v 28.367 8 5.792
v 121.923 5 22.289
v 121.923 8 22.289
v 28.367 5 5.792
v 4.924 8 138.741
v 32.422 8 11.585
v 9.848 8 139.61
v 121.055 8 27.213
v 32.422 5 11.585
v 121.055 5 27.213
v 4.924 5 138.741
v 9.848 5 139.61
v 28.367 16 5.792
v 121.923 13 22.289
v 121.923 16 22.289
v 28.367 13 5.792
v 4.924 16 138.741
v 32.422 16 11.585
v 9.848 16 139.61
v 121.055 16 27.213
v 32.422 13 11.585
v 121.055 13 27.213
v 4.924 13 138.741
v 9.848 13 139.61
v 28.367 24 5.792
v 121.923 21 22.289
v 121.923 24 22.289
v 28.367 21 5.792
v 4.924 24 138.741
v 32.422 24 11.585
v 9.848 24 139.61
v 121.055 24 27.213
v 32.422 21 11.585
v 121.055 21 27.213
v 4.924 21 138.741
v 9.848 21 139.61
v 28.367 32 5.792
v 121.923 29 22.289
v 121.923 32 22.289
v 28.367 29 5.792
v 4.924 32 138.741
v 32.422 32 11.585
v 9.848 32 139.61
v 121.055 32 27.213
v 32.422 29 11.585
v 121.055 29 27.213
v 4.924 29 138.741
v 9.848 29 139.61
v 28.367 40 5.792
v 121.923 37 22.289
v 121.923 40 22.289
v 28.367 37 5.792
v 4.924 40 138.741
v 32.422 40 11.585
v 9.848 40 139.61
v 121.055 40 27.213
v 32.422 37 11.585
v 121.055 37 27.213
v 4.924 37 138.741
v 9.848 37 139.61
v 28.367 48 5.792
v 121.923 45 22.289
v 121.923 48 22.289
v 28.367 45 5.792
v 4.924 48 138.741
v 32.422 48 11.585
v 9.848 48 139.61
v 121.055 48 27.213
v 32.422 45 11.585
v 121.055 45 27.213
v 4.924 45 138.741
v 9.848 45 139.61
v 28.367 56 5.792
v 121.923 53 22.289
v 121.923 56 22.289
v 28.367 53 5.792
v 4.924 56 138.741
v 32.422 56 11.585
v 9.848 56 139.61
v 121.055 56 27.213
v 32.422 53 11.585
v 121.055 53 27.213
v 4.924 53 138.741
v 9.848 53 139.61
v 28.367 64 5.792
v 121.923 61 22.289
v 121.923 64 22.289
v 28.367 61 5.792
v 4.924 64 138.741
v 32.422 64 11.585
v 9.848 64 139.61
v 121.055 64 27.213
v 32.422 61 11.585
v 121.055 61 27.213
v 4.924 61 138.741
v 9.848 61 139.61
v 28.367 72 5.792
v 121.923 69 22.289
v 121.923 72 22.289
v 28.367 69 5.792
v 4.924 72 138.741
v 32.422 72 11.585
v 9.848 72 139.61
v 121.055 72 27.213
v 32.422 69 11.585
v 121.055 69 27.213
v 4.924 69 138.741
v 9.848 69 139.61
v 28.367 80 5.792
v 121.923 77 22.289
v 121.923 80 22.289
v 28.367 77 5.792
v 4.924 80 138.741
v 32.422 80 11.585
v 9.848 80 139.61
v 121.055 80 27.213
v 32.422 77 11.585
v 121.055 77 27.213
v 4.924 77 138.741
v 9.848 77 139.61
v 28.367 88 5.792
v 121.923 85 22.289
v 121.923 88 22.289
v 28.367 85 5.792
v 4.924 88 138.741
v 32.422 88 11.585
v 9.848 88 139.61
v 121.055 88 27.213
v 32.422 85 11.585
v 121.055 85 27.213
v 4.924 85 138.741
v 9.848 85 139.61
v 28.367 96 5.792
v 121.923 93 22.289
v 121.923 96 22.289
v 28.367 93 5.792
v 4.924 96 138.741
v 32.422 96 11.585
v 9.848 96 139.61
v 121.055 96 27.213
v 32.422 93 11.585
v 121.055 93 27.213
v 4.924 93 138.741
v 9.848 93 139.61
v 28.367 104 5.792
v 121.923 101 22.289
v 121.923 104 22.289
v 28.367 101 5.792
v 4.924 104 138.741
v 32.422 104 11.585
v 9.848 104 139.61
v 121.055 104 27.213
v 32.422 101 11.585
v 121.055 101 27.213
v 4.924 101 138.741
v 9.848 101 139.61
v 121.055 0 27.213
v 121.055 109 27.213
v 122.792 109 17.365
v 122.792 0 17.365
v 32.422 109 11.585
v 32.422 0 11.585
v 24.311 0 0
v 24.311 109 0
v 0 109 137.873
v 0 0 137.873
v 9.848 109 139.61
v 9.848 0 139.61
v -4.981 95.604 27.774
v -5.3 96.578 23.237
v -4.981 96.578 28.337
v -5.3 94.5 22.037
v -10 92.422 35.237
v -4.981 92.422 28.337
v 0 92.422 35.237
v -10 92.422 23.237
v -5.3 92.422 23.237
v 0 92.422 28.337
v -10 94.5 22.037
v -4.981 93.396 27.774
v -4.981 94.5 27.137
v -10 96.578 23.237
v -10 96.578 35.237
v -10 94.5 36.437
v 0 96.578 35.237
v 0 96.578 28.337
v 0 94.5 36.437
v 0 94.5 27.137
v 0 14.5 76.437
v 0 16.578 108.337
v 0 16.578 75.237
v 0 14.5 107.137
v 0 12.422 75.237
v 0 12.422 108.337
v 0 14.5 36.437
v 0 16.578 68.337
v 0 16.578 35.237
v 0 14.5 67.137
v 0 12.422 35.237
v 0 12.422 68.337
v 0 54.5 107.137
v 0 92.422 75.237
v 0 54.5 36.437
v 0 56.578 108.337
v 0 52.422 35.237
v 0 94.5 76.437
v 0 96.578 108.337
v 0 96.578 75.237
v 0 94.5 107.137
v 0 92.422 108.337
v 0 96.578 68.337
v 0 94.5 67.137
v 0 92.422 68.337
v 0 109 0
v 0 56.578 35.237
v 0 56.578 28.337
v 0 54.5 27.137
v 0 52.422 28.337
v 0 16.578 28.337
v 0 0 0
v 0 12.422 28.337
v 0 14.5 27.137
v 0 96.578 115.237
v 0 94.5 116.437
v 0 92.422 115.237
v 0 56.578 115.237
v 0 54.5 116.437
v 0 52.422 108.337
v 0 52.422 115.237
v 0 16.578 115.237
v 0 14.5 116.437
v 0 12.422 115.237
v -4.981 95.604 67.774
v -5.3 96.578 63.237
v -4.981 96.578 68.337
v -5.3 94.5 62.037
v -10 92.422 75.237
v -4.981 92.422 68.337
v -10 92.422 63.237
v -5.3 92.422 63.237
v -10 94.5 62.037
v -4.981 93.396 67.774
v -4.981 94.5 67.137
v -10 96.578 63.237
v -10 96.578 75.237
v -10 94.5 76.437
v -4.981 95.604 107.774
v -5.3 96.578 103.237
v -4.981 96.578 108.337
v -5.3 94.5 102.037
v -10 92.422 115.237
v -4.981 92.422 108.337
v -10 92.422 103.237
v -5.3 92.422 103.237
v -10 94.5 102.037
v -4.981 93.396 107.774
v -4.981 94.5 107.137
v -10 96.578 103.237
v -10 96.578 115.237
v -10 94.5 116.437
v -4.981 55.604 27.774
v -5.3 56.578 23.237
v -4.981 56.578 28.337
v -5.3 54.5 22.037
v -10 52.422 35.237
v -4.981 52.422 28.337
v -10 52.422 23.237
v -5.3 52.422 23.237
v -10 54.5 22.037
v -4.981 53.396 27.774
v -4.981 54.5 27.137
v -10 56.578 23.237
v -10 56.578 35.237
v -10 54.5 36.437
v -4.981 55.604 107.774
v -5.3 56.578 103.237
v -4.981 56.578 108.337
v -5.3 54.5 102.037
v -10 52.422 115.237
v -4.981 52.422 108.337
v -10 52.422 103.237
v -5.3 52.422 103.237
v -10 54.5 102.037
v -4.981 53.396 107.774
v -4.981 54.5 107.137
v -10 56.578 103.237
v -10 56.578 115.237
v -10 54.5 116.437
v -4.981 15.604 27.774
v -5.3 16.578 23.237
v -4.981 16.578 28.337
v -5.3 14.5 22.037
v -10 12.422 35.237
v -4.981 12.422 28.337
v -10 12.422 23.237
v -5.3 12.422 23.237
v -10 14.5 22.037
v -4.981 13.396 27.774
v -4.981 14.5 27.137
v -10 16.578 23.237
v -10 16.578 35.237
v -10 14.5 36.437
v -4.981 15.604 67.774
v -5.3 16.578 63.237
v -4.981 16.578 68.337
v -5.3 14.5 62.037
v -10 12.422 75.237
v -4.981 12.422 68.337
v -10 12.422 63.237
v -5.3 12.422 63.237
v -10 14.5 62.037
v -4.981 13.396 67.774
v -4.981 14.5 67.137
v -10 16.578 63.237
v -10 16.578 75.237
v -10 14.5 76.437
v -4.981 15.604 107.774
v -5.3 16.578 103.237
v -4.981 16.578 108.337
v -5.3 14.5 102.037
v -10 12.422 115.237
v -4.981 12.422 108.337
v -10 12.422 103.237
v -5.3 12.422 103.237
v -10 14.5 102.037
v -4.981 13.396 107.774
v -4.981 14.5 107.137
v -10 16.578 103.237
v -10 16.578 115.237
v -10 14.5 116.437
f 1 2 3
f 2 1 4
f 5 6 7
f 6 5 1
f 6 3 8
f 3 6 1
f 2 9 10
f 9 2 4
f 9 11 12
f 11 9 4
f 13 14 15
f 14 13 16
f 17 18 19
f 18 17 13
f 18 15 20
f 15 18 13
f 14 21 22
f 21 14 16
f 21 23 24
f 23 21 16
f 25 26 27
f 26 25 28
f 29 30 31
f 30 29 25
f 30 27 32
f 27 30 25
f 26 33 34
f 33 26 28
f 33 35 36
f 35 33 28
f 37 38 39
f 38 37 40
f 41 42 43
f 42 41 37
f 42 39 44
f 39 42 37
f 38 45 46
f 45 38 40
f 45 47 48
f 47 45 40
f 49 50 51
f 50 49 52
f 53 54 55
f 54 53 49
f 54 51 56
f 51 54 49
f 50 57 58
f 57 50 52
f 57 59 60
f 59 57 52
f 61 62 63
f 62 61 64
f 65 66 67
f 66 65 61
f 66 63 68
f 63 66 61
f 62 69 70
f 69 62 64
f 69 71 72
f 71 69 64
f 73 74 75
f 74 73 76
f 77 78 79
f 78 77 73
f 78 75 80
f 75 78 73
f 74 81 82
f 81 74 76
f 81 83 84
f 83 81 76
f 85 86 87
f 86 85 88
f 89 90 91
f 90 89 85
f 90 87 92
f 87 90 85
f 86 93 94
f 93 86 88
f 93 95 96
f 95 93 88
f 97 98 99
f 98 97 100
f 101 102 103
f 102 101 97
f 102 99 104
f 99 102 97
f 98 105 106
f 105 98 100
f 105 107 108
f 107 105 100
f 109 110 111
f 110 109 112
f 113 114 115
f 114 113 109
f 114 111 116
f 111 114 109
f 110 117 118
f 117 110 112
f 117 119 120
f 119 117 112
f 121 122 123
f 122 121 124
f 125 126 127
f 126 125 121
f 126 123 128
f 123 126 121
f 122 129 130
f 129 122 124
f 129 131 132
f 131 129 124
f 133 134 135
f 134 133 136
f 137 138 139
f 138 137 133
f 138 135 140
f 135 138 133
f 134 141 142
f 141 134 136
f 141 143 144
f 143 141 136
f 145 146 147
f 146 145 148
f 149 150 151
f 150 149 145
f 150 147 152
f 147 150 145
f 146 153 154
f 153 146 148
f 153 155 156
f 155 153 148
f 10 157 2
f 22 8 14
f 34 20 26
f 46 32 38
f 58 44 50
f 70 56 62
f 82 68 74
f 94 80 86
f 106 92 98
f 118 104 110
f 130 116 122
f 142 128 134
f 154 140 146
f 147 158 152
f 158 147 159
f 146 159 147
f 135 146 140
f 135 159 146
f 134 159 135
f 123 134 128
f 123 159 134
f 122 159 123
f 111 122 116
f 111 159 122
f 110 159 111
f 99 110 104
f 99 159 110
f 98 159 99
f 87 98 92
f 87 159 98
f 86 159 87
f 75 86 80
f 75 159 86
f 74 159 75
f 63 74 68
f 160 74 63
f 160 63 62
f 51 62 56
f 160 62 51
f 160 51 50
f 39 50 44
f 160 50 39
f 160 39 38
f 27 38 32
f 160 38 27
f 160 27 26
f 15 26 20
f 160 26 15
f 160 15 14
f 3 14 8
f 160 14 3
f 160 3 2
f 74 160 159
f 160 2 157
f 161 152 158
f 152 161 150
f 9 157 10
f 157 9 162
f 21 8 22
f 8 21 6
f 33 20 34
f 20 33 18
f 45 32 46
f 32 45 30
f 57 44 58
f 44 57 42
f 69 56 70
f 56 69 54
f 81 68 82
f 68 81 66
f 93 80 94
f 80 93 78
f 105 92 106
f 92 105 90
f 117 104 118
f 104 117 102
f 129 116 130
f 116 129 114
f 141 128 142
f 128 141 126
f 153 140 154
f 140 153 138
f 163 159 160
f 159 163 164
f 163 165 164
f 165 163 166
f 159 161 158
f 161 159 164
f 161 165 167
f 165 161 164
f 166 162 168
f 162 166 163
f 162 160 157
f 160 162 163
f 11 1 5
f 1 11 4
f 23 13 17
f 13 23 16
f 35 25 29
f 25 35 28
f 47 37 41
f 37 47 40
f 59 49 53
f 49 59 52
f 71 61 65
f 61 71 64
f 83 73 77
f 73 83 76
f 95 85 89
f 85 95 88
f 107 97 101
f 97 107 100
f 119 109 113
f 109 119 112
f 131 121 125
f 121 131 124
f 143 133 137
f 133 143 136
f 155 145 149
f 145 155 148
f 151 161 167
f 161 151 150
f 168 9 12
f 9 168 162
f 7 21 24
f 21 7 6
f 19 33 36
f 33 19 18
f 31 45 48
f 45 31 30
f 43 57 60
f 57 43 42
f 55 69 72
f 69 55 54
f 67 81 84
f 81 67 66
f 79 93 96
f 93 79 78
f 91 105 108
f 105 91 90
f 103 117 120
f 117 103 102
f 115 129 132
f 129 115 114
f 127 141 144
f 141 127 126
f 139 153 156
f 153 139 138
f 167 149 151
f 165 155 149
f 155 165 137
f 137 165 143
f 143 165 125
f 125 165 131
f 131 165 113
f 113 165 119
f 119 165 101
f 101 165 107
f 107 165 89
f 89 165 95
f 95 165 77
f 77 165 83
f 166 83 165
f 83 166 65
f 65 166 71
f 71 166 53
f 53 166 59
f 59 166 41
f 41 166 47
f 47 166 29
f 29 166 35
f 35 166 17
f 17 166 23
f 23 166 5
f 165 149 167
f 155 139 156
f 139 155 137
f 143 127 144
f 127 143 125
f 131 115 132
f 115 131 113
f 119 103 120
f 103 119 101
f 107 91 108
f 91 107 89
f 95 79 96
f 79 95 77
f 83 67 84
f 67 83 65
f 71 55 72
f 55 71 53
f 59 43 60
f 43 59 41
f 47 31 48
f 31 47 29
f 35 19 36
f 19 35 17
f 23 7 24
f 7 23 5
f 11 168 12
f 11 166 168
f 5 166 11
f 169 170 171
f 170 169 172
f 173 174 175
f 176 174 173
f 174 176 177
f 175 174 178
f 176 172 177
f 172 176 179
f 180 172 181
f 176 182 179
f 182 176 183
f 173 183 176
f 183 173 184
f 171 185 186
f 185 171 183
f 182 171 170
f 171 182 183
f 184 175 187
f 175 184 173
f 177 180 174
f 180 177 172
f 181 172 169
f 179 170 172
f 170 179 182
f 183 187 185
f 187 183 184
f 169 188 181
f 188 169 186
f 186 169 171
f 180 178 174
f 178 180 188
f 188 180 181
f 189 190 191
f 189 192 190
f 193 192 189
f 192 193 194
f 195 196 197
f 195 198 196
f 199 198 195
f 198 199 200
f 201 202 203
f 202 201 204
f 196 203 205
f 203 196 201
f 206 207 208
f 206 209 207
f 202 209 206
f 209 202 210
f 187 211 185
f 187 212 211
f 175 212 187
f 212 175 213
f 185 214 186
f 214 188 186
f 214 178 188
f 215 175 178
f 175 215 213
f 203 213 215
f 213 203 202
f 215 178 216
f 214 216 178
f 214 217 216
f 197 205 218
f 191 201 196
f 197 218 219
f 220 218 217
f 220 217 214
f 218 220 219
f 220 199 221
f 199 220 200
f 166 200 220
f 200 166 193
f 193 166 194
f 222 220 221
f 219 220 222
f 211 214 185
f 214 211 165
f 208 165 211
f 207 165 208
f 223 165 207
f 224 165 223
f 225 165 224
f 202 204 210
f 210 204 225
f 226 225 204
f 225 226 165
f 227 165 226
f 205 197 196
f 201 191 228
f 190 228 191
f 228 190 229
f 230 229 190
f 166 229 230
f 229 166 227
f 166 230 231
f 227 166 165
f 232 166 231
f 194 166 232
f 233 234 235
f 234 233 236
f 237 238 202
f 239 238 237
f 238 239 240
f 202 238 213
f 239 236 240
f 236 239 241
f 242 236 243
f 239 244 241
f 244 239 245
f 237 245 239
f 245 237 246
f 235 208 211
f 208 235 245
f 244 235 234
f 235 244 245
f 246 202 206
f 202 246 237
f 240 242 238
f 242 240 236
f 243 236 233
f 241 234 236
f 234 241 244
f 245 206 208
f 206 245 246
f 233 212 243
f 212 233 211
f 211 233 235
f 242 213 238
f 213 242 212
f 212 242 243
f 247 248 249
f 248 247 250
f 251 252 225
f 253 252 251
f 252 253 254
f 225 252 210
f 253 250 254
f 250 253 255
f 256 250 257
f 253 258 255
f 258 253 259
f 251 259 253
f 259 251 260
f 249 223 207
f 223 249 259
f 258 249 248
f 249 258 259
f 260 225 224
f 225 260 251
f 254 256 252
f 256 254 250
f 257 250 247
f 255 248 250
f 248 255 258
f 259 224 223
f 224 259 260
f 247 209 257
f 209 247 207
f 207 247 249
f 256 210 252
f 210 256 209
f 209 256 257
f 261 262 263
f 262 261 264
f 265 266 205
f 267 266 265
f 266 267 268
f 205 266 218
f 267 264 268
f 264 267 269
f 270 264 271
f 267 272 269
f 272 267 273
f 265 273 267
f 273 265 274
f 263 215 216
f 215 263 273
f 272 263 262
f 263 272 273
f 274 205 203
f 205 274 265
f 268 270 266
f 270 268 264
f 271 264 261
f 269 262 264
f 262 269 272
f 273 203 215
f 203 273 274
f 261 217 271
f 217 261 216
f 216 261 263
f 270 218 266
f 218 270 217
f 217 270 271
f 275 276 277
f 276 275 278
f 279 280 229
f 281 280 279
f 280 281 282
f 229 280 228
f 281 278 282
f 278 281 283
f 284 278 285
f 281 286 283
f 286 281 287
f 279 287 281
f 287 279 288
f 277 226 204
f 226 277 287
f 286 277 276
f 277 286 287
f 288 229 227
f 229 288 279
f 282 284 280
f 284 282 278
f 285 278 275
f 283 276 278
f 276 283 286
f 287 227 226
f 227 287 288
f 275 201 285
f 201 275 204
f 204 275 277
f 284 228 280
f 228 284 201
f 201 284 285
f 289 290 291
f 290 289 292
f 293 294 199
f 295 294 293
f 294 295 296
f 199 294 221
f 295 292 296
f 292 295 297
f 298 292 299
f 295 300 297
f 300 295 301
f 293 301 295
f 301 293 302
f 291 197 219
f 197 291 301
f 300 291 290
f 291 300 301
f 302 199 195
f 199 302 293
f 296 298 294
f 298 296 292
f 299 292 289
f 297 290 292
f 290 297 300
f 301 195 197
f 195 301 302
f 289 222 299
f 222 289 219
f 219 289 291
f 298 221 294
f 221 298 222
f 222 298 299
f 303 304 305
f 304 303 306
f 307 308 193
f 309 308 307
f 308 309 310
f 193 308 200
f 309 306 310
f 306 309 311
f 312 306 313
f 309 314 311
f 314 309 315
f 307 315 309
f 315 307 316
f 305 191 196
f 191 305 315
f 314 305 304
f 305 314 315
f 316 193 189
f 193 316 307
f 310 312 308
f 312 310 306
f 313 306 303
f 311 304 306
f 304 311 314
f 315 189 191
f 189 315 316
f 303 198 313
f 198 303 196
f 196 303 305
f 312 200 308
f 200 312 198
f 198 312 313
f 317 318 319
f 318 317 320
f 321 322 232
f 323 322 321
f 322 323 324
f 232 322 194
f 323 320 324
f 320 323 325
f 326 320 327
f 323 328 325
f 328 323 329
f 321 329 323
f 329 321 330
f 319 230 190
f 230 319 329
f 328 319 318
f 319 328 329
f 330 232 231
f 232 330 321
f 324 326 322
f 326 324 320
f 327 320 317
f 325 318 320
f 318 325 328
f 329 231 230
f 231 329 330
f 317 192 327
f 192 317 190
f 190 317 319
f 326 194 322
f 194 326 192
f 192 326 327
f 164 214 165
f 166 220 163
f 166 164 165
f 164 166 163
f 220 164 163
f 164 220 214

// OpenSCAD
// SKADIS PCB Holder

SLOTS = 13;
SLOT_WIDTH = 3;
SLOT_SPACING = 5;
SLOT_DEPTH = 5;
HEIGHT = 140;
DEPTH = 100;
WALL = 5;
ANGLE = 10;

tiny = 0.01;

aoffset = sin(ANGLE) * HEIGHT;
boffset = cos(ANGLE) * HEIGHT; 
echo(aoffset, boffset);

w = SLOTS * (SLOT_WIDTH + SLOT_SPACING) + SLOT_SPACING;

translate([aoffset,0,0]) rotate([0,-ANGLE,0]) {
  // Bottom
  SlottedPlate(DEPTH, w);
  // Upright
  rotate([0,90,0]) translate([-HEIGHT,0,0]) SlottedPlate(HEIGHT, w);
}

// Body
translate([0,w,0]) rotate([90,0,0]) linear_extrude(w) polygon([
  [0,0], [0,boffset], [aoffset,0]
]);

translate([0,w,0]) rotate([0,0,-90]) hooks(w, boffset, "edge", 10);

module SlottedPlate(x,y) {
  difference() {
    cube([x, y, WALL + SLOT_DEPTH]);
    for (s=[0:1:SLOTS-1]) {
      translate([-tiny, SLOT_SPACING + s * (SLOT_SPACING + SLOT_WIDTH), WALL]) cube([x+2*tiny, SLOT_WIDTH, SLOT_DEPTH+tiny]);
    }
  }
}

module hooks(x, y, mode="all", min_edge=10) {
  hook_width = 5;
  hook_height = 15;
  cols = floor((x - 2*min_edge - hook_width)/20)+1;
  offsetX = (x - ((cols-1)*20)) / 2;
  echo("cols", cols)
  echo("offsetX", offsetX);

  rows = floor((y - 2*min_edge)/40)+1;
  offsetY = (hook_height/2) + (y - ((rows)*40)) / 2;
  echo("rows", rows)
  echo("offsetY", offsetY);

  translate([offsetX, 0, offsetY])
  for (col = [0:1:cols-1]) {
    for (row = [0:1:rows-1]) {
      inbetween_offset = col % 2 ? 0 : 20;
      is_bottom_row = col % 2 == 0 ? row == 0 : row == 1;
      if (mode == "all" ||
         (mode == "edge" && (
            col == 0 || // Left
            row == 0 || // Bottom
            col == cols-1 || // Right
            (col % 2 == 0 ? row == rows-1 : false)))
        ) {
        //color(is_bottom_row ? "red" : "black")
        if (inbetween_offset + row * 40 > 0)
          translate([col * 20, 0, inbetween_offset + row * 40]) hook();
      }
    }
  }
}

module hook() {
  // t is the amount we reduce the width/height by to let it fit ok
  t = 0.1;
  // w = width
  w = 5;
  // wt is the width less the t
  wt = w - t * 2;
  // h is the hight less a bit to make it fit
  h = 15 - 0.3;
  // h2 is the height of the smaller part of the peg
  h2 = h - 5;
  // ht is the height less t
  ht = h - t;
  // d is the depth of the board
  d = 5;
  // 12 gives us enough facets to create a easy to print angle
  $fn = 6;

  translate([0, -d*2, -wt/2]) rotate([270, 90,0]) union() {
    // The larger part of the peg
    hull() {
      cylinder(d=wt, h=d + 0.3);
      // -0.3 is the taper applied to the face that makes contact with the back on the pegboard
      translate([ht-w, 0, 0]) cylinder(d=wt, h=d -0.3);
    }
    // The smaller part of the peg
    translate([0, 0, 0]) hull() {
      cylinder(d=wt, h = d * 2);
      translate([h2 - w - t * 2 ,0 ,0]) cylinder(d=wt, h=d * 2);
      };
  }
}
